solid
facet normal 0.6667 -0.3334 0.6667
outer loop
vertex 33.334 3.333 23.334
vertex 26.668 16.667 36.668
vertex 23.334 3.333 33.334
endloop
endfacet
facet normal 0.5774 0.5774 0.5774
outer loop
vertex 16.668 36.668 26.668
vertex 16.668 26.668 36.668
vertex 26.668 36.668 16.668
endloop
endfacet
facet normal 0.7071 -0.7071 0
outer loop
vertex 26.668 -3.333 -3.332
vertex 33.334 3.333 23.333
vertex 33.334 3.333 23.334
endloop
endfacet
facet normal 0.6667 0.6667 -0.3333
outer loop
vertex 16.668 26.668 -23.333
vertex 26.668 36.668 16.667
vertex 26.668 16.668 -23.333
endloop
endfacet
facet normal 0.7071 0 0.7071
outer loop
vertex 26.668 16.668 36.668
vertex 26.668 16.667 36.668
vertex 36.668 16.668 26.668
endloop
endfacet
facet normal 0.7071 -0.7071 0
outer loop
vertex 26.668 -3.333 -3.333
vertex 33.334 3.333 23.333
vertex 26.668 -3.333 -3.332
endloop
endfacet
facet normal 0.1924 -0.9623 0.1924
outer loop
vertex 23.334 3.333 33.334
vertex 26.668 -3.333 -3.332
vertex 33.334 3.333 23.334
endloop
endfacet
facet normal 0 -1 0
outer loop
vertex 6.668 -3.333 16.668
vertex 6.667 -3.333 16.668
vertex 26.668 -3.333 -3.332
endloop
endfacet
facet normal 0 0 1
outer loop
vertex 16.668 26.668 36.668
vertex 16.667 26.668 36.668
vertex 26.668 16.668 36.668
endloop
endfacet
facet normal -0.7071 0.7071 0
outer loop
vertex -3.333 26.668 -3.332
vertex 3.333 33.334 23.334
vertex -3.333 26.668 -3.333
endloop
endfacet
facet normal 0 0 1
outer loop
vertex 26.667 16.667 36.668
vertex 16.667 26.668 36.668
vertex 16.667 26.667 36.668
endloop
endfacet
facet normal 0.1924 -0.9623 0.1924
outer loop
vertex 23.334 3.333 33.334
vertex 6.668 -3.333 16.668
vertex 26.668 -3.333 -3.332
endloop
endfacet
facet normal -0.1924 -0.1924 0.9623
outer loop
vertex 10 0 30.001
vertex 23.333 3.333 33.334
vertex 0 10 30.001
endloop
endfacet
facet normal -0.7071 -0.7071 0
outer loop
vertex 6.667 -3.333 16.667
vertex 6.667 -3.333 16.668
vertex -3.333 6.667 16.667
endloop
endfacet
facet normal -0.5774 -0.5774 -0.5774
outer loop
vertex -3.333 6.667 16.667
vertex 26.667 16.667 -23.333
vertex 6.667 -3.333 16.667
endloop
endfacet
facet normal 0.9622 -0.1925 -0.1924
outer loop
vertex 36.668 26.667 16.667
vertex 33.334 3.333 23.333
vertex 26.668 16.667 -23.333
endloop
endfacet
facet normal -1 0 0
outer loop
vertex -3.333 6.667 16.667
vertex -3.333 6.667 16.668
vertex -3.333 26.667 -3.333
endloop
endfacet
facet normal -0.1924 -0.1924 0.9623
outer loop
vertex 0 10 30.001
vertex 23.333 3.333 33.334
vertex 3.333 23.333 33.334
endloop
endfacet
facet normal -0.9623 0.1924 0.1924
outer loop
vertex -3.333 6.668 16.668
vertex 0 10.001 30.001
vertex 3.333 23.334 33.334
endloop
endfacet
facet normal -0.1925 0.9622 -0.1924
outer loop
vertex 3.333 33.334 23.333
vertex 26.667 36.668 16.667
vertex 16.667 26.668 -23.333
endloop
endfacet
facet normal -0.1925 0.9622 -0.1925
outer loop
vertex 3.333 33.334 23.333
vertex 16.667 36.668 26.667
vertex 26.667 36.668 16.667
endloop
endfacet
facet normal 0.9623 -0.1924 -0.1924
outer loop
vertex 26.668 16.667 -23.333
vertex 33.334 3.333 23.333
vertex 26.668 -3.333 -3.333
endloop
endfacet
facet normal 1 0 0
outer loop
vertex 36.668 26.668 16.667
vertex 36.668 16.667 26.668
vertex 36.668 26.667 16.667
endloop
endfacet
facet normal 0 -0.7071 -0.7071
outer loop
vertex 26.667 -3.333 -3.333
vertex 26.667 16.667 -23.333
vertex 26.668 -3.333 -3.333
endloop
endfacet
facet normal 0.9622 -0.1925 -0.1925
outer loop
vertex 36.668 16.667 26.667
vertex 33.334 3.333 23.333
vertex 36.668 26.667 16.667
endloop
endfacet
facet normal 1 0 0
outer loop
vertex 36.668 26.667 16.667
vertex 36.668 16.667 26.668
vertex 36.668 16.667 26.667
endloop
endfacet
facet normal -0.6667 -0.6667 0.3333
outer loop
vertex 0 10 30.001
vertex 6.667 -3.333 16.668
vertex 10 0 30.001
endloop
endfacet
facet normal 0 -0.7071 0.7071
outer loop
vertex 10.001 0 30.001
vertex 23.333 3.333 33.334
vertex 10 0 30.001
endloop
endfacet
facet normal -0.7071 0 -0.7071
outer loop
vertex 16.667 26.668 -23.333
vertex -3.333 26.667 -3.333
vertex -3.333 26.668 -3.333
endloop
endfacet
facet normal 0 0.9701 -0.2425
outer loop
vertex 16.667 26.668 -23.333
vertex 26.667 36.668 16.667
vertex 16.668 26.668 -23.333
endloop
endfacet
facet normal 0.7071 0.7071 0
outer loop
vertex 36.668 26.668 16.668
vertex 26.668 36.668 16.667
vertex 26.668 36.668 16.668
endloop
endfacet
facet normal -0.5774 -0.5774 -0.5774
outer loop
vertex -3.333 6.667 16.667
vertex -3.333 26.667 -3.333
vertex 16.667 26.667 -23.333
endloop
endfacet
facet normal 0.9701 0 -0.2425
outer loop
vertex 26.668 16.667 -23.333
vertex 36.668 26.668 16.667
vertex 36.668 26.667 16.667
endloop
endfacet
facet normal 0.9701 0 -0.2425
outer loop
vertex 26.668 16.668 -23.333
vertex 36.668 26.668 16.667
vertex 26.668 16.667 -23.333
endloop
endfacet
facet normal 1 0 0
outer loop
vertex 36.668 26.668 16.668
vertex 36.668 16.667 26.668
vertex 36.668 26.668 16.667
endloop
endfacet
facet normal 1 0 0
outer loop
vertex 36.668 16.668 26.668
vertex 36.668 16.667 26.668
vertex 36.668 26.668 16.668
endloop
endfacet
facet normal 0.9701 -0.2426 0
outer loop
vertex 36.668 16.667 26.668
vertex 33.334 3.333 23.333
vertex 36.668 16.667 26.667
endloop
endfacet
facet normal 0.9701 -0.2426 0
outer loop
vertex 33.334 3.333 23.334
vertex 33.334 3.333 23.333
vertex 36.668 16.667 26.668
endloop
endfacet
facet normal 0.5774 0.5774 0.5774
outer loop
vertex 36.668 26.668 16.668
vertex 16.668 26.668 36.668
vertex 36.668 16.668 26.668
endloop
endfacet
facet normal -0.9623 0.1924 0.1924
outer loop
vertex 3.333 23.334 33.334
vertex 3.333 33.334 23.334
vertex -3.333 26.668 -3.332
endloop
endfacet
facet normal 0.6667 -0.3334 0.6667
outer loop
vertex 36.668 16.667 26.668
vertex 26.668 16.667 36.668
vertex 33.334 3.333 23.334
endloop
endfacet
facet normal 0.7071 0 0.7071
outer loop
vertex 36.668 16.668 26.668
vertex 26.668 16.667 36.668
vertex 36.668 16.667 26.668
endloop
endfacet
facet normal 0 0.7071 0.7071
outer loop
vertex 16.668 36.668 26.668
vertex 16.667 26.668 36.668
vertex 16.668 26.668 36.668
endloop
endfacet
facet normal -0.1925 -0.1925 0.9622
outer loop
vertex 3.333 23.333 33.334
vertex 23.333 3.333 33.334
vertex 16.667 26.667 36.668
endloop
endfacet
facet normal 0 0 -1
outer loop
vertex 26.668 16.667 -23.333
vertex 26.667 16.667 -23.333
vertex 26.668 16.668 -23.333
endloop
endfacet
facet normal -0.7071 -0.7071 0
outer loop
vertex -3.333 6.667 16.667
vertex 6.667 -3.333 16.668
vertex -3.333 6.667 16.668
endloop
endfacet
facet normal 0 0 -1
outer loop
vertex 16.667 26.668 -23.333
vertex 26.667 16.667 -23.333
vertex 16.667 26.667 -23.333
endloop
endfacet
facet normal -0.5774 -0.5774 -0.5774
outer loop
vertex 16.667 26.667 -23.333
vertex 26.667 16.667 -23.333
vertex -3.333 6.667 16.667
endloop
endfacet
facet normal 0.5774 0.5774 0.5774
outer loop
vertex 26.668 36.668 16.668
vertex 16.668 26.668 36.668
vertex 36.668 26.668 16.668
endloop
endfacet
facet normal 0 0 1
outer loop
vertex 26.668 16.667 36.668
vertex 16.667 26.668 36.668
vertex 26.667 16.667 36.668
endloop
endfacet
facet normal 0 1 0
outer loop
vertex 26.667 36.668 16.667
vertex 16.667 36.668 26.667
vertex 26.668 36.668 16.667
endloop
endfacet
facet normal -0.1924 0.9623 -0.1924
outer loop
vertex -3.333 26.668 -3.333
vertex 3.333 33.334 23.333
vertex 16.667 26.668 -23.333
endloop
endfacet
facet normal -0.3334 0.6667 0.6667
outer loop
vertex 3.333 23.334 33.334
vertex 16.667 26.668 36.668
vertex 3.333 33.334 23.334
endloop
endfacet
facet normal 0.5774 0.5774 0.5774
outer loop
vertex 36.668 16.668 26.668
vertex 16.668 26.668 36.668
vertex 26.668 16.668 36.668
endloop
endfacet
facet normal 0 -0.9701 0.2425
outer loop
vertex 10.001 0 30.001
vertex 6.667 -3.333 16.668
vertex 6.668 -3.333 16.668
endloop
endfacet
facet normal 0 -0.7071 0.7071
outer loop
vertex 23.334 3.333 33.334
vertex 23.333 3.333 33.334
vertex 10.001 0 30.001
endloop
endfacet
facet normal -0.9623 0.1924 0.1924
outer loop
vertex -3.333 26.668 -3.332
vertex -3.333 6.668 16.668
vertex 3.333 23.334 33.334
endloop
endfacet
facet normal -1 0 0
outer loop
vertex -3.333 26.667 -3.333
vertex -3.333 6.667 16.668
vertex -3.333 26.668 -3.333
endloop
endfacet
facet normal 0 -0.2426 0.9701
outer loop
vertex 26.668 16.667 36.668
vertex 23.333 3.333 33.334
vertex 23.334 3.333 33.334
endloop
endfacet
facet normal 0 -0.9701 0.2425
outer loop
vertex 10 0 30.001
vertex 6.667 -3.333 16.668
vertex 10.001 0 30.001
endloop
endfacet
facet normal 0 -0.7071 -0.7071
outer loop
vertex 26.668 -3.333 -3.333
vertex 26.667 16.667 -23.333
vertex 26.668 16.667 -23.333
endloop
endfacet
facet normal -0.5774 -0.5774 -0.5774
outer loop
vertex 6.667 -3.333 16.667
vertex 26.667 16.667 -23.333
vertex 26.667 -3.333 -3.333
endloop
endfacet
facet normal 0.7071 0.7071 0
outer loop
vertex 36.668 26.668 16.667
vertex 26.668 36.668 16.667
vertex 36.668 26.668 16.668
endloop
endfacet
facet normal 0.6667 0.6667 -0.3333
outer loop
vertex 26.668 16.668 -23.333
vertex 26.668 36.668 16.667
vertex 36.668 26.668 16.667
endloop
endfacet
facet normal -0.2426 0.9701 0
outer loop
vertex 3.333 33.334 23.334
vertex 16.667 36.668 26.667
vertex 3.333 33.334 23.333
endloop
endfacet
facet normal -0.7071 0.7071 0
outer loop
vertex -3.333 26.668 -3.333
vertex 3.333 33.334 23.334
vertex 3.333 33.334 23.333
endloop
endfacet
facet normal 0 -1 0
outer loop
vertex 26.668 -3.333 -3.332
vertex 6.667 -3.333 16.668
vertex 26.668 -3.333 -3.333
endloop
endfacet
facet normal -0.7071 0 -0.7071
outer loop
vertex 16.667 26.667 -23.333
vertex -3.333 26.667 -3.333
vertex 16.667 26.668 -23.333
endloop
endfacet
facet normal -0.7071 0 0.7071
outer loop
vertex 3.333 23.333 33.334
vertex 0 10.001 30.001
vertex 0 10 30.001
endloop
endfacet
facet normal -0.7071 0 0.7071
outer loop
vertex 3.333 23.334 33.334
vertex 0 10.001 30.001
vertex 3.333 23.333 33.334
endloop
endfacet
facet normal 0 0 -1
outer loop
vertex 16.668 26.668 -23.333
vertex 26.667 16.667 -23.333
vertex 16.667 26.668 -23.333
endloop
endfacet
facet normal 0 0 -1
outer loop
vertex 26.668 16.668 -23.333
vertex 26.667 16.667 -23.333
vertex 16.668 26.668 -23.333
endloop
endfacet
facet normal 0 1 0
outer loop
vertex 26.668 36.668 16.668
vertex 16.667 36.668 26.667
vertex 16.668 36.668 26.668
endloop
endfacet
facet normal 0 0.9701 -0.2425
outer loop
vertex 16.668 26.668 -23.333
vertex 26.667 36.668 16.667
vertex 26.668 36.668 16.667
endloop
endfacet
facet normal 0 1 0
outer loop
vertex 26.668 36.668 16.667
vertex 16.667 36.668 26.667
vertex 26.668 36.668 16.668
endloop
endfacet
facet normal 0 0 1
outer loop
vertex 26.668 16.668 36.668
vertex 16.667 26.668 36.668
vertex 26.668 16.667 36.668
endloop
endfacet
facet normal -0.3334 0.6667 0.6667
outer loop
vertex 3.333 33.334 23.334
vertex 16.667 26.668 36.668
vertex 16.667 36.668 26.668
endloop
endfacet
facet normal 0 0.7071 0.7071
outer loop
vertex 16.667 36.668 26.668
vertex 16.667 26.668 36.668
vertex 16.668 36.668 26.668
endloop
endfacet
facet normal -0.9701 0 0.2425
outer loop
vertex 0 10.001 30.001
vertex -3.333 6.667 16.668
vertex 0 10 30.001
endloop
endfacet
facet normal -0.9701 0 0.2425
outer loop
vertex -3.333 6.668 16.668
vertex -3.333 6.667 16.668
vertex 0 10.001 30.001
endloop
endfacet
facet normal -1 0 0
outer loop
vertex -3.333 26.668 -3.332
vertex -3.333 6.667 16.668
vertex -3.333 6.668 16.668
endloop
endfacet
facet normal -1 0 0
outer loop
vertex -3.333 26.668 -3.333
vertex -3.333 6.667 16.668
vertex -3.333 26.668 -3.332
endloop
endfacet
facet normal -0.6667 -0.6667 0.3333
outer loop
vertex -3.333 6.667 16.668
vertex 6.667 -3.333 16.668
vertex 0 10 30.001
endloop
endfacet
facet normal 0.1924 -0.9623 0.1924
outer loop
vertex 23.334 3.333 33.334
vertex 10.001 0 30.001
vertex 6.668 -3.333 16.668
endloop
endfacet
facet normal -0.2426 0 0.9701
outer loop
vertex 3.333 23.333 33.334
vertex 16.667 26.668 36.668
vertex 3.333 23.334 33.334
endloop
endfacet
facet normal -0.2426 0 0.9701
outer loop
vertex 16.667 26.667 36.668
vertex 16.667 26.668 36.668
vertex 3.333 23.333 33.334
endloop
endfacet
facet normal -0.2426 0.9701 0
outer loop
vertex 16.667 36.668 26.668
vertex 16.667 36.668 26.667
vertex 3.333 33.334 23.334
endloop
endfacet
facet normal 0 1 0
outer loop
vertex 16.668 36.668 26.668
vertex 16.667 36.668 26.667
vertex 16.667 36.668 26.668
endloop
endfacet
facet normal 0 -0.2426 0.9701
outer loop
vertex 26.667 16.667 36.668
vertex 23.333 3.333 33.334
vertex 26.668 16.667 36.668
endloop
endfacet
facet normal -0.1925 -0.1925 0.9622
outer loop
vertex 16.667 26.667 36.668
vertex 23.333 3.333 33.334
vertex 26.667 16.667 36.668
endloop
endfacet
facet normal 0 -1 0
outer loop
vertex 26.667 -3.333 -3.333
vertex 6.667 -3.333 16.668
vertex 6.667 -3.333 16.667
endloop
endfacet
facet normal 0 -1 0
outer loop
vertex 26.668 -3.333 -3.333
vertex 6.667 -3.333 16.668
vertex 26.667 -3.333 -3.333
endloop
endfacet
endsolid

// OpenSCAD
module convex_poly(l) {
     hull() { for (point=l) translate (point) cube(0.0001); }
};

// compute the sum of a list of vectors
function sum_vects(l) = (len(l) == 0) ? [0,0,0] :
     sum_vects([for (i = [0:1:len(l)-2]) l[i]]) + l[len(l)-1];

// Todo : generate with a rec module
perm4 = [[0,1,2,3],[0,1,3,2],[0,2,1,3],[0,2,3,1],[0,3,1,2],[0,3,2,1],
	 [1,0,2,3],[1,0,3,2],[1,2,0,3],[1,2,3,0],[1,3,0,2],[1,3,2,0],
	 [2,0,1,3],[2,0,3,1],[2,1,0,3],[2,1,3,0],[2,3,0,1],[2,3,1,0],
	 [3,0,1,2],[3,0,2,1],[3,1,0,2],[3,1,2,0],[3,2,0,1],[3,2,1,0]];

ass4 =  [[0,1,2,3],[0,1,3,2],[0,2,1,3],         ,[0,3,1,2],[0,3,2,1],
	 [1,0,2,3],[1,0,3,2],         ,         ,         ,         ,
	 [2,0,1,3],         ,[2,1,0,3],         ,         ,         ,
	 [3,0,1,2],[3,0,2,1],[3,1,0,2],         ,[3,2,0,1],[3,2,1,0]];

cube4 = [[0,1,2,3],[0,1,3,2],         ,         ,[0,3,1,2],[0,3,2,1],
	          ,         ,         ,         ,         ,         ,
	          ,         ,         ,         ,         ,         ,
	 [3,0,1,2],[3,0,2,1],         ,         ,[3,2,0,1],[3,2,1,0]];
     
permtree4 = [[4, 1, 1, 4],
 [3, 4, 2, 1],
 [1, 4, 3, 2],
 [4, 3, 2, 1],
 [4, 3, -1, 4],
 [4, 1, 3, 2],
 [2, 4, 3, 1],
 [4, 2, 3, 1],
 [1, 4, 1, 4],
 [3, 2, 4, 1],
 [3, 4, -1, 4],
 [2, 3, 4, 1],
 [2, 1, 3, 4],
 [3, 1, 4, 2],
 [1, 2, 3, 4],
 [1, 3, 4, 2],
 [2, 1, 4, 3],
 [1, 2, 4, 3]];

// projection matrix 4D -> 3D
projmatrix = [[1, 0, 0], [0, 1, 0], [0, 0, 1], [-1/3, -1/3, -1/3]];

//scale(10) convex_poly([for (p=perm4) p * projmatrix]);
scale(10) convex_poly([for (p=permtree4) p * projmatrix]);
// scale(20) convex_poly([for (p=ass4) p * projmatrix]);
// scale(10) convex_poly([for (p=cube4) p * projmatrix]);
